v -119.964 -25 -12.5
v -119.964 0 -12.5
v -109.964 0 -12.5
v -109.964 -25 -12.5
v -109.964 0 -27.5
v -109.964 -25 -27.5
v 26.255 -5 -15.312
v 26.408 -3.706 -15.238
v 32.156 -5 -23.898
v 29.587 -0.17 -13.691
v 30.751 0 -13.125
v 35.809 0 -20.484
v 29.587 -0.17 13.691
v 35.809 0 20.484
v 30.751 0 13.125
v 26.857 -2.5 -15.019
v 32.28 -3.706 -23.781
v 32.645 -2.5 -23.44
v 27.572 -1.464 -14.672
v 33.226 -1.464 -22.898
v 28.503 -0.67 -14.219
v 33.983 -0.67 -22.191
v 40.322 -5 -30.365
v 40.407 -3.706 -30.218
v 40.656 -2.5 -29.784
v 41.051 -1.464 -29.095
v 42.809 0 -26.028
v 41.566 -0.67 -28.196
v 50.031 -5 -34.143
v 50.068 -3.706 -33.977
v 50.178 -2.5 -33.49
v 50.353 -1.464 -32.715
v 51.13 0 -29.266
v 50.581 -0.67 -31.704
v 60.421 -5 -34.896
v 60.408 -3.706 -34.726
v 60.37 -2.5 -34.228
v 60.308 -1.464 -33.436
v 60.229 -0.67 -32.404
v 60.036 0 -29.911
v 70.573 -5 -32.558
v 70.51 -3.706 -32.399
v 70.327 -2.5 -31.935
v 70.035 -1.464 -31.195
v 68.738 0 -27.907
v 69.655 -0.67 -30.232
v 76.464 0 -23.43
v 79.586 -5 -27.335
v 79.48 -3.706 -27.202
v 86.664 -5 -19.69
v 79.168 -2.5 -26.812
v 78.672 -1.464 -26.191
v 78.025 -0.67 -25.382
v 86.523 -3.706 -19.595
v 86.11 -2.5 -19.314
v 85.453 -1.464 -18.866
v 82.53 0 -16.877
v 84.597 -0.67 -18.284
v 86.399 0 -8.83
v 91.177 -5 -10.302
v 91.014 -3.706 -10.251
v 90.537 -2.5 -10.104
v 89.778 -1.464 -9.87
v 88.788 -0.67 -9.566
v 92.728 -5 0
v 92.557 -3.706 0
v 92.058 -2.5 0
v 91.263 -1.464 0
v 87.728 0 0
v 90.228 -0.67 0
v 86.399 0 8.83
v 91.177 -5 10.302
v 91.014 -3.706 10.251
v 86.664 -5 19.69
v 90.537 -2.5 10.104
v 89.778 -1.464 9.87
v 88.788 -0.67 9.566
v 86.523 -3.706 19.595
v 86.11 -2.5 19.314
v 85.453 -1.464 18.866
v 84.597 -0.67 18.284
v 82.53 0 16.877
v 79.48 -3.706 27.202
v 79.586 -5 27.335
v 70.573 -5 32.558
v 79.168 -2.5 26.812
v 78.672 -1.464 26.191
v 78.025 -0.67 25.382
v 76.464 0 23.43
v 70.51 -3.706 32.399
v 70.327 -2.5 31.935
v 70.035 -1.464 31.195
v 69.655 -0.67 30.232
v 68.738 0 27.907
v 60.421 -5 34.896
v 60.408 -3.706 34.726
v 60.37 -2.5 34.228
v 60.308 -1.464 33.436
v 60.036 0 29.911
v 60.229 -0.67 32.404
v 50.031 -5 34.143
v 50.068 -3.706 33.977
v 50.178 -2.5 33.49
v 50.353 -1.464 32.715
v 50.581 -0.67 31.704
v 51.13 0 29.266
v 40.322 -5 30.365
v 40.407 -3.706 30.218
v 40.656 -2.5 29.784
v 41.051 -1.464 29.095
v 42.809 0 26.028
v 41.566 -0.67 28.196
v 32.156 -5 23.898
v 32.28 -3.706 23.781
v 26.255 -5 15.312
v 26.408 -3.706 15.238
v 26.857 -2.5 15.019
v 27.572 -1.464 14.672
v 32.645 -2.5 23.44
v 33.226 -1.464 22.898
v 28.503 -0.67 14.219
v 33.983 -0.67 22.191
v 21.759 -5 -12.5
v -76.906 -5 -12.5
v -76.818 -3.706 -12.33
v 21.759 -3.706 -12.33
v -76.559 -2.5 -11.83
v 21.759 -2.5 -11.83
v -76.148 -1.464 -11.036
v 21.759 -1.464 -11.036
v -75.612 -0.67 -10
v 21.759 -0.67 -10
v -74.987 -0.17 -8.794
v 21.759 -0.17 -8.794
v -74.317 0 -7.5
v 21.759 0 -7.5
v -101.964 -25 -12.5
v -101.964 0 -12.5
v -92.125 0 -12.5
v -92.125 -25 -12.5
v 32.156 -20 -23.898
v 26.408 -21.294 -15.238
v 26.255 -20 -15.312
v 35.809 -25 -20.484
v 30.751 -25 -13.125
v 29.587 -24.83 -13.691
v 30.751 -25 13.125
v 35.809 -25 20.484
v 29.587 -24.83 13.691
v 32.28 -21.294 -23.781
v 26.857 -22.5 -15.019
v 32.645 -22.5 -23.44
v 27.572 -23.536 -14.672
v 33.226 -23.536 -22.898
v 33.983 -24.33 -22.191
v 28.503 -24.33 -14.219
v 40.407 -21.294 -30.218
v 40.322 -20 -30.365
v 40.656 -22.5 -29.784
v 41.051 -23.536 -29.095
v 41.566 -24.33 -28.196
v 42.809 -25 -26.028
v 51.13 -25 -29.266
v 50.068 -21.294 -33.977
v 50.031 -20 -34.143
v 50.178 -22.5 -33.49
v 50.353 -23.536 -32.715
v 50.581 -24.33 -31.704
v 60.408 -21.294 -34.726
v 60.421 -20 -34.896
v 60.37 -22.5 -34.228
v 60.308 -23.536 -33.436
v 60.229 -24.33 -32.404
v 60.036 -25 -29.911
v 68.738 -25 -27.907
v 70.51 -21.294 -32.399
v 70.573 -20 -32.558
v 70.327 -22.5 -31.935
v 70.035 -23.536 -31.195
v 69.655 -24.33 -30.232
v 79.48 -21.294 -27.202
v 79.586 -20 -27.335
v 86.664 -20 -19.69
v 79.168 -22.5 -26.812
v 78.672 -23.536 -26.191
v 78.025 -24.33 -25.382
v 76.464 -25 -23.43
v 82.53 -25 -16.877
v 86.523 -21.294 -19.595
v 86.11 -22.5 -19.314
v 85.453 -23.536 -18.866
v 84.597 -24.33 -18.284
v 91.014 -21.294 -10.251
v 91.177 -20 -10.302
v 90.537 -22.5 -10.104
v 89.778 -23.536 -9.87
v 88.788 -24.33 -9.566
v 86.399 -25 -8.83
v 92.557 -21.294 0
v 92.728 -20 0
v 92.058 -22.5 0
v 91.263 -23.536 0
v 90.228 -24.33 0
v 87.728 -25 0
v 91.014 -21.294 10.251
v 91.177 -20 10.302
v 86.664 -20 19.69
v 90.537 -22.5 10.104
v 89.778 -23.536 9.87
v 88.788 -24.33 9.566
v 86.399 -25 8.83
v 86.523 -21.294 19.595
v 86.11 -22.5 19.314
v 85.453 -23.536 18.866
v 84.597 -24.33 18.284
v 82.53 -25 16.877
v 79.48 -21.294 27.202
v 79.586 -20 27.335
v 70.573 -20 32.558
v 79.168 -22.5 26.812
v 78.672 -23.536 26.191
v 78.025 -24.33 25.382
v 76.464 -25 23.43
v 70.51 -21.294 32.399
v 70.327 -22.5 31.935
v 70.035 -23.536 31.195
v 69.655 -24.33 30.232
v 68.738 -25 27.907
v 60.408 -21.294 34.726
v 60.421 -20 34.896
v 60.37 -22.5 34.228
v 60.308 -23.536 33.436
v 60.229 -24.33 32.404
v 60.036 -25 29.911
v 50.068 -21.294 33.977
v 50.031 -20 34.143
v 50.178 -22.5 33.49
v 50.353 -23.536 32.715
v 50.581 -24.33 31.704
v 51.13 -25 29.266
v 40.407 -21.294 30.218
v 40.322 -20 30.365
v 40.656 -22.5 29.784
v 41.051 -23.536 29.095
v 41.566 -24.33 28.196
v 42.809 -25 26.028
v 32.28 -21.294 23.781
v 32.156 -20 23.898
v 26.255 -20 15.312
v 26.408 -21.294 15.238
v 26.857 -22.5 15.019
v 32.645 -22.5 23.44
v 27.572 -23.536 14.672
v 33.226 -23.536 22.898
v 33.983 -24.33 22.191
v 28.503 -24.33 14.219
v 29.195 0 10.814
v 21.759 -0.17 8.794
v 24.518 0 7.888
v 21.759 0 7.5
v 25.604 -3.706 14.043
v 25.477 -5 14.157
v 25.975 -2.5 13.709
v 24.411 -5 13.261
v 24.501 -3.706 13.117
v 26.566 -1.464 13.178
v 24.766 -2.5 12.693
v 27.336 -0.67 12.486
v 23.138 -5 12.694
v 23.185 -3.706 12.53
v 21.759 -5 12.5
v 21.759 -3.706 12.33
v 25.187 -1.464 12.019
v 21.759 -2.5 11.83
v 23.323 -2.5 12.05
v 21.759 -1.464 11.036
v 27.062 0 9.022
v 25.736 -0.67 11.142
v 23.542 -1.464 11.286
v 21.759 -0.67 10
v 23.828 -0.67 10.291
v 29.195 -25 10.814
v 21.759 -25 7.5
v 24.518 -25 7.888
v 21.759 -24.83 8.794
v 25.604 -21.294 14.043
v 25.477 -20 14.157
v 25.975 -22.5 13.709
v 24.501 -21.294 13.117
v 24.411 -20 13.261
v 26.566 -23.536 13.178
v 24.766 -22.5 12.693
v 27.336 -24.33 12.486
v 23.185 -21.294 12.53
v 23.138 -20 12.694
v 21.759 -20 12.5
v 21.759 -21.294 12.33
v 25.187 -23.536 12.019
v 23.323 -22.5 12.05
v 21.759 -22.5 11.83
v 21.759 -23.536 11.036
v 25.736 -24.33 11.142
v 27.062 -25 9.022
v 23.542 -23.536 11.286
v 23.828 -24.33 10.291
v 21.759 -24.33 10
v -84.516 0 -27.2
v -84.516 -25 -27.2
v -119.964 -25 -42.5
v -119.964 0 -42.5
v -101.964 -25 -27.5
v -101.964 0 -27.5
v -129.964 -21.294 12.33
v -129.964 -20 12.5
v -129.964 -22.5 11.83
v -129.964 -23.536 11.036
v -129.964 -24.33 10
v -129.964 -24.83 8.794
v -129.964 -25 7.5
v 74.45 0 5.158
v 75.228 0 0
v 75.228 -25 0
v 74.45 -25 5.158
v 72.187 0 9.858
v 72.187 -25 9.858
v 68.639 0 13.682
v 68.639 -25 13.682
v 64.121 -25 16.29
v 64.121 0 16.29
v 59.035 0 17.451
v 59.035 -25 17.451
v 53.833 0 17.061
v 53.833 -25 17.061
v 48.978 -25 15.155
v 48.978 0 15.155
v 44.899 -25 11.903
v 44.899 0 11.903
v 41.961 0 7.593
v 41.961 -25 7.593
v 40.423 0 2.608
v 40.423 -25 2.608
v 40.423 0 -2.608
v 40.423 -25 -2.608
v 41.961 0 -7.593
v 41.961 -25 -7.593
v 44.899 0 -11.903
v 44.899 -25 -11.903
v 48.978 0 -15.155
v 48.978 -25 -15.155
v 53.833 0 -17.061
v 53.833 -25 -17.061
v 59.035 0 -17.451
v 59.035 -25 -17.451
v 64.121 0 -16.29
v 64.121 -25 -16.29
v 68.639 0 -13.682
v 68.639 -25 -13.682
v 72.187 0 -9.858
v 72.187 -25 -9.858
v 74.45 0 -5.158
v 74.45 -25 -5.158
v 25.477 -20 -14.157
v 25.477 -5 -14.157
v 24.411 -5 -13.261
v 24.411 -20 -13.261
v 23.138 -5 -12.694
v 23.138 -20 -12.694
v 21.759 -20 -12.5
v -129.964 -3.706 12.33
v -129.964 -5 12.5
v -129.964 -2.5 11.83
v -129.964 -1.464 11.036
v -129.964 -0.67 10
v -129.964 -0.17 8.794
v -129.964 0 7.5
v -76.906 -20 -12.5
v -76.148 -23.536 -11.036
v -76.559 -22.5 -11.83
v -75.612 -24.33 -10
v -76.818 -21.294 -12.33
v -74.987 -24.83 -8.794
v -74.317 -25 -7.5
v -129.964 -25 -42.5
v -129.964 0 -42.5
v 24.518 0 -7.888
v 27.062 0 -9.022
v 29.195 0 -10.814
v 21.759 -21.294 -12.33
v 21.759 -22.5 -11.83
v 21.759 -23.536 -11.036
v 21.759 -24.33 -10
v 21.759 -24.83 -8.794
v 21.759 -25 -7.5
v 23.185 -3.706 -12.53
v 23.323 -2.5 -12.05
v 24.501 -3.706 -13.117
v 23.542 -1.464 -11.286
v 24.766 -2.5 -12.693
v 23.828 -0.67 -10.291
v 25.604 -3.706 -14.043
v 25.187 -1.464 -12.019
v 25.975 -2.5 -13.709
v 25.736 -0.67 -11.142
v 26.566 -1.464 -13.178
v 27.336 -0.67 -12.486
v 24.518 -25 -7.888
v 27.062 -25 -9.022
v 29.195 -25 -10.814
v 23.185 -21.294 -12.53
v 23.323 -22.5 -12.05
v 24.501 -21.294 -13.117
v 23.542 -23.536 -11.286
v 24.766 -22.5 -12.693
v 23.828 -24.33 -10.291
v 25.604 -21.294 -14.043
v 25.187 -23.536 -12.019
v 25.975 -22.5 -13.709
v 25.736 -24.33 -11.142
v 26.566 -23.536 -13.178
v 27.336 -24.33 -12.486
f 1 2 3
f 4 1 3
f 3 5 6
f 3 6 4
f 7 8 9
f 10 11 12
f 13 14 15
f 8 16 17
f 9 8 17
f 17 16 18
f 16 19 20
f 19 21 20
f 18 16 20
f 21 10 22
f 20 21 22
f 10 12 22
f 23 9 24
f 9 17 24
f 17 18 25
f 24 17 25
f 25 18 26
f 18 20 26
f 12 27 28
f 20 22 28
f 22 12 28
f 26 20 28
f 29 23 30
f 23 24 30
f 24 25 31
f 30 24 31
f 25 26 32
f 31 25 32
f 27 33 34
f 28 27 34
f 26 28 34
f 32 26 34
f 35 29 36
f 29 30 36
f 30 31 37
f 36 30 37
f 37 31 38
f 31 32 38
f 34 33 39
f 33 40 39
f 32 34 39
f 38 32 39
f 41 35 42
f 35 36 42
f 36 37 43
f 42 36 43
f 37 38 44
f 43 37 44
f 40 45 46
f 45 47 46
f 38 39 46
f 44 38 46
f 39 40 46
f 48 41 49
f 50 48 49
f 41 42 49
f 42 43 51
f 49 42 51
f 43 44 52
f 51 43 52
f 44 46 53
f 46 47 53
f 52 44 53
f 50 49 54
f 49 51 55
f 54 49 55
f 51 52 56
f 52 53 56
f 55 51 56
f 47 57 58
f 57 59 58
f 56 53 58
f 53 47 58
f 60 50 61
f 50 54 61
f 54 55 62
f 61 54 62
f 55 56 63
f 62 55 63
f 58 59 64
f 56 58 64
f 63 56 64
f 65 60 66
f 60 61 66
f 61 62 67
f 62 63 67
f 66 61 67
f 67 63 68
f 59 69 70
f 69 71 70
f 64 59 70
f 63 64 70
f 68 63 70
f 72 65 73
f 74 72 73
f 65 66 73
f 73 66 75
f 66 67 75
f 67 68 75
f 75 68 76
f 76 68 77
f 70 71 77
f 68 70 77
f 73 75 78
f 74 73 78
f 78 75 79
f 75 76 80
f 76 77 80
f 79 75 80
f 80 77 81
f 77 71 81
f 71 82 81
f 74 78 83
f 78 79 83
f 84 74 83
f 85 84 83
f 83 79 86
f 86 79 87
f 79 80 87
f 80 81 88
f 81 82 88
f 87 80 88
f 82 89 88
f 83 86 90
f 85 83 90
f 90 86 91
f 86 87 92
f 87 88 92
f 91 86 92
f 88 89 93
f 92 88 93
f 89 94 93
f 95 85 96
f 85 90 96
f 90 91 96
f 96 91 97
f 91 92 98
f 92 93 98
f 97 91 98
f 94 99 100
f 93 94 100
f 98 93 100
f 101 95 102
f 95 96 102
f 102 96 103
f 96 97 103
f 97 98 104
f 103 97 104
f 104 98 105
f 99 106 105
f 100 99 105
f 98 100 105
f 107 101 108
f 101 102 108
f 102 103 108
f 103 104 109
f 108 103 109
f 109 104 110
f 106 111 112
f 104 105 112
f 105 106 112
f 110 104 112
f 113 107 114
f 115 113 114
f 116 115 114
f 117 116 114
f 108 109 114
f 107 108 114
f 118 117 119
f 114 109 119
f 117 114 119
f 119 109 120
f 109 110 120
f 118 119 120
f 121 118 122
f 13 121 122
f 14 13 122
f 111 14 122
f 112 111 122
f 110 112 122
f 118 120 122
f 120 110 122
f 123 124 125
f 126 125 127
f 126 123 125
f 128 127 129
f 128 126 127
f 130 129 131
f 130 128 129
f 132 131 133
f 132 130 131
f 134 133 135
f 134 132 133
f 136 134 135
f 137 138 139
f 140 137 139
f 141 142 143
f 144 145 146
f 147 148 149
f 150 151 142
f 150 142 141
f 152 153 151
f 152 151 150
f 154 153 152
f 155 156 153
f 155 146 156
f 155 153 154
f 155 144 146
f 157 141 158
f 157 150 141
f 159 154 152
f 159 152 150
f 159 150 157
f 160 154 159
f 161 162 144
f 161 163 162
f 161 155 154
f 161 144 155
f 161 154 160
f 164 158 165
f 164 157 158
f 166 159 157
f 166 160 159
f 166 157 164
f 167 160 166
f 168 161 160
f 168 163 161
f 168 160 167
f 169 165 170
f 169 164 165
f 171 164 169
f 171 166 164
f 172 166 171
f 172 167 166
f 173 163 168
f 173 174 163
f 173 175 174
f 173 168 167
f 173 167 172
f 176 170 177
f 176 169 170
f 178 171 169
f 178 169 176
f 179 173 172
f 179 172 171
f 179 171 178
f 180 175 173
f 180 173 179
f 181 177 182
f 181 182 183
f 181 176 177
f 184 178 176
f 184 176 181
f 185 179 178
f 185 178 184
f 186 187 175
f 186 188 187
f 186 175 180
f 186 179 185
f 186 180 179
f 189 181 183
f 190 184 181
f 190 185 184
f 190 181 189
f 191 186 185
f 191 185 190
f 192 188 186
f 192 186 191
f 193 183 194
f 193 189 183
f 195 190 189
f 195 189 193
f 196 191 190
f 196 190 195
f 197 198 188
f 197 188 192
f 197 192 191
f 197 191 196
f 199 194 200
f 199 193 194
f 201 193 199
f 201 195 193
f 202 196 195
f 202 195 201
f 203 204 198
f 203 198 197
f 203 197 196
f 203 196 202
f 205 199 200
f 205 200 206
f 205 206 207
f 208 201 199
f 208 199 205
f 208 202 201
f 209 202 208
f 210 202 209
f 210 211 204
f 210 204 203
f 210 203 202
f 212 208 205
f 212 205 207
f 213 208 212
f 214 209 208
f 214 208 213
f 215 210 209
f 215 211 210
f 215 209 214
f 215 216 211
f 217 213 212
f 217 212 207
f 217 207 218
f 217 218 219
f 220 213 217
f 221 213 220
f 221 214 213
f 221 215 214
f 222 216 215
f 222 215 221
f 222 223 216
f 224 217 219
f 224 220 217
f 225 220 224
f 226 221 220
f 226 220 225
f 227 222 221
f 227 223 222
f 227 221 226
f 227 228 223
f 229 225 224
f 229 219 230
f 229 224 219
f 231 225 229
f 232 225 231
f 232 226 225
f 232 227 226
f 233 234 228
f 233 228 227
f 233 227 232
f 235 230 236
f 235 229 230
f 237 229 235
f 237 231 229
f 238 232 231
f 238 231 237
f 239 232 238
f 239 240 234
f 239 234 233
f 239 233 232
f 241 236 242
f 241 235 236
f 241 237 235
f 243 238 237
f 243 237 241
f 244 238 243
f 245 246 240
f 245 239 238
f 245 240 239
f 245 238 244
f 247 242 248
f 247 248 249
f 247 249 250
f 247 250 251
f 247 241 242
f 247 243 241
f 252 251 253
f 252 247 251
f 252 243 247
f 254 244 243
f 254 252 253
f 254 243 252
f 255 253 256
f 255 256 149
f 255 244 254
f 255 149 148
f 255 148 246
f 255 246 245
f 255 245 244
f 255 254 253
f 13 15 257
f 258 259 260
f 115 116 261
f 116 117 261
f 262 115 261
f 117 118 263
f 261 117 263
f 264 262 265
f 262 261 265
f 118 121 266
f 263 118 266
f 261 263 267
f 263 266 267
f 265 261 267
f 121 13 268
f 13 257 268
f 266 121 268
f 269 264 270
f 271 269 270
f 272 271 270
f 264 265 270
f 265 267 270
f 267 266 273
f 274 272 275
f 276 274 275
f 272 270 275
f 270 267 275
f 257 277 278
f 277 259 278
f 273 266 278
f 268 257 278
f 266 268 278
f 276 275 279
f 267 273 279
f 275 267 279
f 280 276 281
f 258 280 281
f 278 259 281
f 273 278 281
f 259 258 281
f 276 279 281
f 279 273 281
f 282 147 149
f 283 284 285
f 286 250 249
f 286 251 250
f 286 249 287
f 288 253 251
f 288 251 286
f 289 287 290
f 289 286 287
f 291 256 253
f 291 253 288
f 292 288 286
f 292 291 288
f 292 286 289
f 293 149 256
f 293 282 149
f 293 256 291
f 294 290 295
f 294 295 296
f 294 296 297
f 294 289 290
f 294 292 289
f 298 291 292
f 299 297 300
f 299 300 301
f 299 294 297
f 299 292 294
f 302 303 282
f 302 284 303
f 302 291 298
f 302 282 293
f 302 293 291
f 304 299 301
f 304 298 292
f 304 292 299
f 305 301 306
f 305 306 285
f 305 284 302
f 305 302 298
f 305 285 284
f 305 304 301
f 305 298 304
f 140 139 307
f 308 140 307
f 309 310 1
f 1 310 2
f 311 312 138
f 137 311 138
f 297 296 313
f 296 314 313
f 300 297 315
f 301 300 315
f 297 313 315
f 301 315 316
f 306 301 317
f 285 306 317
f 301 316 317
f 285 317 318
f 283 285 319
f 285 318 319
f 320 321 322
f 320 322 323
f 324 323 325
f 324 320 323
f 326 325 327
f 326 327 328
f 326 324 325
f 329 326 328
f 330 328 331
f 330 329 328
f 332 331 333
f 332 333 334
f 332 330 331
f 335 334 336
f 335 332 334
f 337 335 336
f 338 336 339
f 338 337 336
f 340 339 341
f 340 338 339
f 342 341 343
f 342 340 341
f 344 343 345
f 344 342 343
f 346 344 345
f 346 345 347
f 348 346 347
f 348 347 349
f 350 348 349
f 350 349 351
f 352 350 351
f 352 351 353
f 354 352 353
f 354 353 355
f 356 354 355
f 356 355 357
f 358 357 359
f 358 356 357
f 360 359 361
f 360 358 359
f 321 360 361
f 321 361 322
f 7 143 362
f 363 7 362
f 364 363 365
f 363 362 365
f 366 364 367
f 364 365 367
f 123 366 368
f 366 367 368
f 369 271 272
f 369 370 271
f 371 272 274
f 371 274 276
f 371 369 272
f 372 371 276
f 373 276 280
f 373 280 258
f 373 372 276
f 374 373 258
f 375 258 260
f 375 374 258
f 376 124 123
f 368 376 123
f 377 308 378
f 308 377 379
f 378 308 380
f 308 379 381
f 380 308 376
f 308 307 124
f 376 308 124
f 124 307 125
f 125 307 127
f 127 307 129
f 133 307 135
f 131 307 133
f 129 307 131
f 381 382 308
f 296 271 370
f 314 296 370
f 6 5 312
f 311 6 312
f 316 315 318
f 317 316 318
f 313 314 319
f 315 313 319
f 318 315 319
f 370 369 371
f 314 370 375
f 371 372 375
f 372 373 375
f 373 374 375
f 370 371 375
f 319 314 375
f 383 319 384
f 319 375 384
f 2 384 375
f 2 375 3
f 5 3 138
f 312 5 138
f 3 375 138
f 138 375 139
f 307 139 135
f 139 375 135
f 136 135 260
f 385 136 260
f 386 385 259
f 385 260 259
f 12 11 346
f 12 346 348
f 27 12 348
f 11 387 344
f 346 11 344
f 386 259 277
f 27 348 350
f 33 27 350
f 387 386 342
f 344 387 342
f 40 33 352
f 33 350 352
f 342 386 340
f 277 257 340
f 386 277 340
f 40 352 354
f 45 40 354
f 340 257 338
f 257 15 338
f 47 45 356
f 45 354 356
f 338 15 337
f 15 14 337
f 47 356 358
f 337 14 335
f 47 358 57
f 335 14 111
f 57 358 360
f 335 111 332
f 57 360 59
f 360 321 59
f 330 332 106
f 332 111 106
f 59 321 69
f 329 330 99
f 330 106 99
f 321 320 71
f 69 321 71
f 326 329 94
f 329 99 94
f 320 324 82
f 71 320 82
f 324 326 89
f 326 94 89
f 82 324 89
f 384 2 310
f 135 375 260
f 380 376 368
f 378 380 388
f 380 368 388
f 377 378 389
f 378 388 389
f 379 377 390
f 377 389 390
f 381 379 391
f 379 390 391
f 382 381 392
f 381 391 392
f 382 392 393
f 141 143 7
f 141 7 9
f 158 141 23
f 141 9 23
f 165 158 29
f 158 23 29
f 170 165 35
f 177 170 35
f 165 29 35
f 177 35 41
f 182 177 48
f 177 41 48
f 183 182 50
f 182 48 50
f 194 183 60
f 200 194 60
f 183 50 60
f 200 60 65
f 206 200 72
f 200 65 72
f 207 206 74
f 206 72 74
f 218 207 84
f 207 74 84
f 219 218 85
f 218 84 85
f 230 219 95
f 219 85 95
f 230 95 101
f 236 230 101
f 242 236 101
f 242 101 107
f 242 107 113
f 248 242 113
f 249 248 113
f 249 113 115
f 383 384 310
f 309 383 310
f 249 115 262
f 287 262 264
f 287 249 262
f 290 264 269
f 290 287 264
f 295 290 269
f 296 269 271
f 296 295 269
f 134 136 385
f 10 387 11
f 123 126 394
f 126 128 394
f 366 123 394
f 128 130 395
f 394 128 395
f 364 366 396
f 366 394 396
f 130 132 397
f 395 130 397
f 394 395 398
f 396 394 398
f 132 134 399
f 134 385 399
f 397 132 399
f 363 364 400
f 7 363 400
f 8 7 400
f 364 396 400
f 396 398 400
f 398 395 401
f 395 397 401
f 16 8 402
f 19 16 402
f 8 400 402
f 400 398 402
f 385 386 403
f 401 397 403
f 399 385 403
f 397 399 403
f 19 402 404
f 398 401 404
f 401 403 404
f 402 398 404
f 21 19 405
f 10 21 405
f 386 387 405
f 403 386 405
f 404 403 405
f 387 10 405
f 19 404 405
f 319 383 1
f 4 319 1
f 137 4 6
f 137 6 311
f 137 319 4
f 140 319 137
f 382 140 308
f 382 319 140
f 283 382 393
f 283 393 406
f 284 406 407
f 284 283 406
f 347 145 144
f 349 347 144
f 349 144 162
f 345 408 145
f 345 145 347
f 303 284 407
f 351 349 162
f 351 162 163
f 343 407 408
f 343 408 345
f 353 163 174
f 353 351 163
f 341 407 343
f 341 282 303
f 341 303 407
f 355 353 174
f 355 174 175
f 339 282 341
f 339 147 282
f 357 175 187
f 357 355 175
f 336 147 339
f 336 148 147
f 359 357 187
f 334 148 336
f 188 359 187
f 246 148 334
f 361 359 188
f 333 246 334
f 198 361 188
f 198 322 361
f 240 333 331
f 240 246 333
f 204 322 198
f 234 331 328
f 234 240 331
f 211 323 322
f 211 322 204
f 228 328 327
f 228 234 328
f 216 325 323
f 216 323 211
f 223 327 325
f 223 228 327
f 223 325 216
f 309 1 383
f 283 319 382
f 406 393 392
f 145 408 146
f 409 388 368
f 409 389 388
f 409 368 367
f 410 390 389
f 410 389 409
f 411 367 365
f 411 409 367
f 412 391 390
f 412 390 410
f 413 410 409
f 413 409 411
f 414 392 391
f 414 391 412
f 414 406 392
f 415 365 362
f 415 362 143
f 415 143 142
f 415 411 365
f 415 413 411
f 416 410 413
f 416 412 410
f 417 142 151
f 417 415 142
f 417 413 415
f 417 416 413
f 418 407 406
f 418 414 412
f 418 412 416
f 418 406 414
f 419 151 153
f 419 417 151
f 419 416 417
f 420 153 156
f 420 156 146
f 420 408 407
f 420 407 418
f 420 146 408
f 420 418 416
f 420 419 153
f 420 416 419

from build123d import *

# Parameters (mm, degrees)
F0_R     = 17.5
F0_W     = 10
F0_H     = 30
F0_W_2   = 8
F0_H_2   = 15
F1_DEPTH = 25
F2_F1_R  = 5
F2_F2_R  = 5


with BuildPart() as f1:
    # F0 (on Front) → F1 (new body)
    with BuildSketch(Plane.XZ):
        with BuildLine():
            Line((-76.905815019, -12.5), (25.0358718634, -12.5))
            ThreePointArc((25.0358718634, -12.5), (92.7276139399, 0), (25.0358718634, 12.5))
            Line((25.0358718634, 12.5), (-129.9641281366, 12.5))
            Line((-129.9641281366, 12.5), (-129.9641281366, -12.5))
            Line((-129.9641281366, -12.5), (-119.9641281366, -12.5))
            Line((-119.9641281366, -12.5), (-109.9641281366, -12.5))
            Line((-109.9641281366, -12.5), (-101.9641281366, -12.5))
            Line((-101.9641281366, -12.5), (-92.1254744445, -12.5))
            Line((-92.1254744445, -12.5), (-76.905815019, -12.5))
        make_face()
        with Locations((57.7276139399, 0)):
            Circle(F0_R, mode=Mode.SUBTRACT)
        with Locations((-124.9641281366, -27.5)):
            Rectangle(F0_W, F0_H)
        with Locations((-105.9641281366, -20)):
            Rectangle(F0_W_2, F0_H_2)
        Polygon((-84.5156447317, -27.2000782564), (-76.905815019, -12.5), (-92.1254744445, -12.5), align=None)
    extrude(amount=F1_DEPTH)

    # F2: fillet of radius 5 on 4 edges, made by hand

    # F2_f1
    f2_f1_edges = [f1.edges().sort_by_distance(p)[0] for p in [
        (25.0358718634, -12.5, -12.5),
        (25.0358718634, -12.5, 12.5),
    ]]
    fillet(f2_f1_edges, radius=F2_F1_R)

    # F2_f2
    f2_f2_edges = [f1.edges().sort_by_distance(p)[0] for p in [
        (92.7276139399, 0, 0),
        (92.7276139399, -25, 0),
        (24.4105279445, -25, -13.2610437605),
        (24.4105279445, -25, 13.2610437605),
        (24.4105279445, 0, -13.2610437605),
        (24.4105279445, 0, 13.2610437605),
    ]]
    fillet(f2_f2_edges, radius=F2_F2_R)


solid = f1.part
